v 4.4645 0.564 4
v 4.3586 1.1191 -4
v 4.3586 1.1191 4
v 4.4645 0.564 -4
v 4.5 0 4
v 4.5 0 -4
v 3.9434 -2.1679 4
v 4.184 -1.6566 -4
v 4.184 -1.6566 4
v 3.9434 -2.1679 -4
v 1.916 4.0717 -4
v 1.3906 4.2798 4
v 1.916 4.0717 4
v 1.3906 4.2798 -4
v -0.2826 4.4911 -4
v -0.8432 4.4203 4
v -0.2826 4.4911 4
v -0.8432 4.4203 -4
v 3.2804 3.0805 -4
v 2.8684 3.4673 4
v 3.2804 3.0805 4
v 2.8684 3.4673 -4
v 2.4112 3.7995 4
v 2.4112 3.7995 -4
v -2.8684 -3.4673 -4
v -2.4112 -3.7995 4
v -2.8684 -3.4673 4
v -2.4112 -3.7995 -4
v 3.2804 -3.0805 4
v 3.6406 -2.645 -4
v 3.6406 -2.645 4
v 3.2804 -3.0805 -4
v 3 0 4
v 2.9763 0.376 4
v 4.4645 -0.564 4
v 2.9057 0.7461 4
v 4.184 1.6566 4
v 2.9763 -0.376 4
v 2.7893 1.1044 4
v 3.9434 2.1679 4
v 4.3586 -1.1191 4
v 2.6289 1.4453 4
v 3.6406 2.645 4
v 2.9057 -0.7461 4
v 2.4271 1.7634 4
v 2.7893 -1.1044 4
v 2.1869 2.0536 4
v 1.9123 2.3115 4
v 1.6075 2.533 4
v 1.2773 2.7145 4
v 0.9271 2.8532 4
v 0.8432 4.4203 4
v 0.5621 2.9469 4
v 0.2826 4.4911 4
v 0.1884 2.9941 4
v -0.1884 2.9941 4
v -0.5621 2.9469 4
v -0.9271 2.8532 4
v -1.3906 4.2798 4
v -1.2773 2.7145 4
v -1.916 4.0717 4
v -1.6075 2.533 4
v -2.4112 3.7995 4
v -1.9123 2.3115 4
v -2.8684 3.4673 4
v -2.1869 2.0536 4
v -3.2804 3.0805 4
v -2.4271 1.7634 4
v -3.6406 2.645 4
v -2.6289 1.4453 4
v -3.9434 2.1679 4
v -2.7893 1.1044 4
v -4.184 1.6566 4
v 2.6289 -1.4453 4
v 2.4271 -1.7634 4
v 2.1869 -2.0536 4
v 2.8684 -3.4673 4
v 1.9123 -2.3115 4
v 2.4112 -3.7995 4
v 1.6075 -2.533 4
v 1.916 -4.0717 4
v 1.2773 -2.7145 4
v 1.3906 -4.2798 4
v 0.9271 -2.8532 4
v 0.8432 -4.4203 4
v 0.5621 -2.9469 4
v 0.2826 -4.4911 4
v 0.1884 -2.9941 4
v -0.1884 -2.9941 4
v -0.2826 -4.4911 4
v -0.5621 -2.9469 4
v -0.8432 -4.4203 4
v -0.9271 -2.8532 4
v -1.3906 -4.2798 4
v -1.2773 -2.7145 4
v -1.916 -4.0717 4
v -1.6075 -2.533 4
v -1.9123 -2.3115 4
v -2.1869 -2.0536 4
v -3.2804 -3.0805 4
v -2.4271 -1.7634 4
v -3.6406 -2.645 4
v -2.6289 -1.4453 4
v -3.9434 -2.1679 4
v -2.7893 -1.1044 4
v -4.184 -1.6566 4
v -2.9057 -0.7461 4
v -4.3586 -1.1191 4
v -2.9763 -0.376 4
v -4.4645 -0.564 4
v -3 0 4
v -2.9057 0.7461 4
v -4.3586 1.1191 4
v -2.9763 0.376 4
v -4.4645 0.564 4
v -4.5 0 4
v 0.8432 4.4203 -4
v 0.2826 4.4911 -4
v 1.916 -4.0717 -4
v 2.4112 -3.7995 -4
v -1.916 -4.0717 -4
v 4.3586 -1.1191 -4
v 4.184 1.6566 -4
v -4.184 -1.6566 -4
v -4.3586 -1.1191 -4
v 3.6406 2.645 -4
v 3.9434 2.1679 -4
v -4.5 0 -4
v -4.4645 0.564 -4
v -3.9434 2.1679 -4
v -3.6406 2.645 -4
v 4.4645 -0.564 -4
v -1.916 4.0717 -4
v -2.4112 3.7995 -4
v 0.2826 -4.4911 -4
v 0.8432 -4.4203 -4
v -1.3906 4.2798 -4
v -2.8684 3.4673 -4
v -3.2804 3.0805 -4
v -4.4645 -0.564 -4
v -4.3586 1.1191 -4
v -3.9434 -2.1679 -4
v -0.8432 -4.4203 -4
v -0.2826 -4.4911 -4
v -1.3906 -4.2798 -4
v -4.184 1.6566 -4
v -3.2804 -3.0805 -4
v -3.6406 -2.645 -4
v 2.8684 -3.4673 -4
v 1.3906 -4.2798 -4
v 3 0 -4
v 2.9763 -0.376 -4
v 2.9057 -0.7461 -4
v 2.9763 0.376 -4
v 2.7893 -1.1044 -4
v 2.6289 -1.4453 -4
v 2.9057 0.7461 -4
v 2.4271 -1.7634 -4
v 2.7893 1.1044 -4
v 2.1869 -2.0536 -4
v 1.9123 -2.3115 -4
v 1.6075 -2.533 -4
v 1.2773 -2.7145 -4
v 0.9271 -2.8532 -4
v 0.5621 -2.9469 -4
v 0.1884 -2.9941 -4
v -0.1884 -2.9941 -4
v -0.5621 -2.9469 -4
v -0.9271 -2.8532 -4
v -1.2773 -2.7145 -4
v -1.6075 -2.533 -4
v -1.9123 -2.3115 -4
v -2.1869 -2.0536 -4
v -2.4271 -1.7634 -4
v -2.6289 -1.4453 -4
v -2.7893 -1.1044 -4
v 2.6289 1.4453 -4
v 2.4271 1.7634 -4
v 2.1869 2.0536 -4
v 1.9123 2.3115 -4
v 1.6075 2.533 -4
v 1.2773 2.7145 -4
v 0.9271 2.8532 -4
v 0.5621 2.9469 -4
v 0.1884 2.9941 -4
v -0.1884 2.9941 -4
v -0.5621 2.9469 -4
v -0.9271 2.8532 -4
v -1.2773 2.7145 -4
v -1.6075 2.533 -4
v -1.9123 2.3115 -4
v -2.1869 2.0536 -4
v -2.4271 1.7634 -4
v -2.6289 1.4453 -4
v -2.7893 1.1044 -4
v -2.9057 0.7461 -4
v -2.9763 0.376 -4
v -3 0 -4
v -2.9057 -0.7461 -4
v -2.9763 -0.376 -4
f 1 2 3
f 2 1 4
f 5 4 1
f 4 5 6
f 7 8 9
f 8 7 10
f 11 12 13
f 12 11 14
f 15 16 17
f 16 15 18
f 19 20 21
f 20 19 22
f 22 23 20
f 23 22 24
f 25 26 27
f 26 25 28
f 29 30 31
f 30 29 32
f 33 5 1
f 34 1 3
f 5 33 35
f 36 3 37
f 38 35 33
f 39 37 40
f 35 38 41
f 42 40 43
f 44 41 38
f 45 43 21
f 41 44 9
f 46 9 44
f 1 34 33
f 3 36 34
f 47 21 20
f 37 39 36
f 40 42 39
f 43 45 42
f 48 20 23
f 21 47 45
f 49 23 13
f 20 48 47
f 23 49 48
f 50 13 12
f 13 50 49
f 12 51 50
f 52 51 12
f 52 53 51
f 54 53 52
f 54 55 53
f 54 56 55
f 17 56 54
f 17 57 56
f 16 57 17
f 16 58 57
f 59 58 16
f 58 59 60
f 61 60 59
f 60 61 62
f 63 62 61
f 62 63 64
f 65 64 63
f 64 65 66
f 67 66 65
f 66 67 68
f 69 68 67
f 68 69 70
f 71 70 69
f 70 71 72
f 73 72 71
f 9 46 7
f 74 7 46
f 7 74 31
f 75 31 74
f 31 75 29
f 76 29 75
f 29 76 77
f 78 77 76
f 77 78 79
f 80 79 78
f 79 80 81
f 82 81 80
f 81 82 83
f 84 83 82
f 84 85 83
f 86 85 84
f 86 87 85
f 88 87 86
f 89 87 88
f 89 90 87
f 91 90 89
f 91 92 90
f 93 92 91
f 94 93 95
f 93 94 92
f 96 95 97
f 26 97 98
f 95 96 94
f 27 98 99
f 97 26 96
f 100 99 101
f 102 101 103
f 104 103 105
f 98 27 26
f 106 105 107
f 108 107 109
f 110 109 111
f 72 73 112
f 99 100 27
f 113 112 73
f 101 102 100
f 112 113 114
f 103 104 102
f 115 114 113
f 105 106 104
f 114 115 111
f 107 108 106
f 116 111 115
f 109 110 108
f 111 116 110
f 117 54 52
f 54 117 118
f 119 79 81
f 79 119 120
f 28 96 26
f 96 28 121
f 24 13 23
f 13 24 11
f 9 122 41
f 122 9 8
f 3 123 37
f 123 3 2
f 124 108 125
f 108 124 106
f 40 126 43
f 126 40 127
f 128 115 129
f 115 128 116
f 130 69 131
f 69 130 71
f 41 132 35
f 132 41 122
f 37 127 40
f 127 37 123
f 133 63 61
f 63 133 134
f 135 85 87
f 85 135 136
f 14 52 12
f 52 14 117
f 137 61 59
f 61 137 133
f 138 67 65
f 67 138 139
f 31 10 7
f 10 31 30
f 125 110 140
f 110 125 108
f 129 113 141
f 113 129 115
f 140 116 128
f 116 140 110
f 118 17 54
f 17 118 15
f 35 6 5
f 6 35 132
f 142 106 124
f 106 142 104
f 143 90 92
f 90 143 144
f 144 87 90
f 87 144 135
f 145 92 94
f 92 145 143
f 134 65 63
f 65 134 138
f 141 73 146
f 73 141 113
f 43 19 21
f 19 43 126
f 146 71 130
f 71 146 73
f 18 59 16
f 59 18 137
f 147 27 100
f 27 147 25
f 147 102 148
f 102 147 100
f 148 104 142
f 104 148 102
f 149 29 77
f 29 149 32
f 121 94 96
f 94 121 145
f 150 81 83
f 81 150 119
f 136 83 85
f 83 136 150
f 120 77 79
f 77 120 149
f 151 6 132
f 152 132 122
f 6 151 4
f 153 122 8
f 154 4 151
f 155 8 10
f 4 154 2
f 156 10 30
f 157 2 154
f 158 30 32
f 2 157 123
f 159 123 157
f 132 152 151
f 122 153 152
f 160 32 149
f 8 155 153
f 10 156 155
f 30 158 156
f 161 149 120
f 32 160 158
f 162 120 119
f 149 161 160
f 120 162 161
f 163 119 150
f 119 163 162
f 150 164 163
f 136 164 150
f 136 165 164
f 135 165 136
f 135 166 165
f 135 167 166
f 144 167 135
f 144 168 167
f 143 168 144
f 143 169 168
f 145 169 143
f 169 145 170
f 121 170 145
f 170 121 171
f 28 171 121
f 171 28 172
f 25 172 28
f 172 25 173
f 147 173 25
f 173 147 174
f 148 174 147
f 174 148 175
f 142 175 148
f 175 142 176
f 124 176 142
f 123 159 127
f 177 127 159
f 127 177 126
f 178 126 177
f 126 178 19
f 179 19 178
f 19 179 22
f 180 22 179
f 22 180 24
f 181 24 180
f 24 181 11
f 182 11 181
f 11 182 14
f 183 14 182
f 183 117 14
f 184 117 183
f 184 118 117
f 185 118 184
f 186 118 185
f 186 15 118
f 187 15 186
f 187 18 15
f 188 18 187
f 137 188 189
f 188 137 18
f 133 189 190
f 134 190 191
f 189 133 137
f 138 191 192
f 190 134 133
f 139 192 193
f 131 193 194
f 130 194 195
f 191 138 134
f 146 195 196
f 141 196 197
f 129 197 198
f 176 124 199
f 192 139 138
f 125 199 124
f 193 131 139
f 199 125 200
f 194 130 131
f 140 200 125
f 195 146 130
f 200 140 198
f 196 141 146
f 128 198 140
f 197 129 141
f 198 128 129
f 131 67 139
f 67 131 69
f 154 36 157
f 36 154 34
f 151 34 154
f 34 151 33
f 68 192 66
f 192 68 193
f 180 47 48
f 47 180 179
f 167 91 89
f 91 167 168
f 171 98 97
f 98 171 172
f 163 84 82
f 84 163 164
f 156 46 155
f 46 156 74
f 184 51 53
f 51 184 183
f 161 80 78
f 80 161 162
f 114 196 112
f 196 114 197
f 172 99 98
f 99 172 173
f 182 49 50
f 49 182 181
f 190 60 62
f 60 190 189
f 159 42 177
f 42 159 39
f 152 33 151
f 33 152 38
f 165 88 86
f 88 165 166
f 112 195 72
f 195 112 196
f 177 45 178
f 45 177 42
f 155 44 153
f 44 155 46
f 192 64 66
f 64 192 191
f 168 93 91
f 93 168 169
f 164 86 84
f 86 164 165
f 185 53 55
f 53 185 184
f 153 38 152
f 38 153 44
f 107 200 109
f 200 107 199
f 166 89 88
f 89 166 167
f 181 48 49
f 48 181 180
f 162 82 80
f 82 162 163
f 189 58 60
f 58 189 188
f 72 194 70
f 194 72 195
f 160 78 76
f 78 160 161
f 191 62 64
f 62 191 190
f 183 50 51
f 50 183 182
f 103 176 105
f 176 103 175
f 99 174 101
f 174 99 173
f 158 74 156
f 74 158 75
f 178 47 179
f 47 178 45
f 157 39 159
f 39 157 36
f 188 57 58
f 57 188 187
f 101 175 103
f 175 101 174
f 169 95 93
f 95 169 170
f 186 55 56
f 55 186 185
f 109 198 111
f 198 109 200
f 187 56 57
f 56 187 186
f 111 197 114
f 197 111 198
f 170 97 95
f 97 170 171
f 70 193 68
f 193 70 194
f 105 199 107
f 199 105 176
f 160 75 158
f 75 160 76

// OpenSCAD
$fn = 50;


difference() {
	union() {
		translate(v = [0, 0, -4.0000000000]) {
			cylinder(h = 8, r = 4.5000000000);
		}
	}
	union() {
		translate(v = [0, 0, -100.0000000000]) {
			cylinder(h = 200, r = 3.0000000000);
		}
	}
}
